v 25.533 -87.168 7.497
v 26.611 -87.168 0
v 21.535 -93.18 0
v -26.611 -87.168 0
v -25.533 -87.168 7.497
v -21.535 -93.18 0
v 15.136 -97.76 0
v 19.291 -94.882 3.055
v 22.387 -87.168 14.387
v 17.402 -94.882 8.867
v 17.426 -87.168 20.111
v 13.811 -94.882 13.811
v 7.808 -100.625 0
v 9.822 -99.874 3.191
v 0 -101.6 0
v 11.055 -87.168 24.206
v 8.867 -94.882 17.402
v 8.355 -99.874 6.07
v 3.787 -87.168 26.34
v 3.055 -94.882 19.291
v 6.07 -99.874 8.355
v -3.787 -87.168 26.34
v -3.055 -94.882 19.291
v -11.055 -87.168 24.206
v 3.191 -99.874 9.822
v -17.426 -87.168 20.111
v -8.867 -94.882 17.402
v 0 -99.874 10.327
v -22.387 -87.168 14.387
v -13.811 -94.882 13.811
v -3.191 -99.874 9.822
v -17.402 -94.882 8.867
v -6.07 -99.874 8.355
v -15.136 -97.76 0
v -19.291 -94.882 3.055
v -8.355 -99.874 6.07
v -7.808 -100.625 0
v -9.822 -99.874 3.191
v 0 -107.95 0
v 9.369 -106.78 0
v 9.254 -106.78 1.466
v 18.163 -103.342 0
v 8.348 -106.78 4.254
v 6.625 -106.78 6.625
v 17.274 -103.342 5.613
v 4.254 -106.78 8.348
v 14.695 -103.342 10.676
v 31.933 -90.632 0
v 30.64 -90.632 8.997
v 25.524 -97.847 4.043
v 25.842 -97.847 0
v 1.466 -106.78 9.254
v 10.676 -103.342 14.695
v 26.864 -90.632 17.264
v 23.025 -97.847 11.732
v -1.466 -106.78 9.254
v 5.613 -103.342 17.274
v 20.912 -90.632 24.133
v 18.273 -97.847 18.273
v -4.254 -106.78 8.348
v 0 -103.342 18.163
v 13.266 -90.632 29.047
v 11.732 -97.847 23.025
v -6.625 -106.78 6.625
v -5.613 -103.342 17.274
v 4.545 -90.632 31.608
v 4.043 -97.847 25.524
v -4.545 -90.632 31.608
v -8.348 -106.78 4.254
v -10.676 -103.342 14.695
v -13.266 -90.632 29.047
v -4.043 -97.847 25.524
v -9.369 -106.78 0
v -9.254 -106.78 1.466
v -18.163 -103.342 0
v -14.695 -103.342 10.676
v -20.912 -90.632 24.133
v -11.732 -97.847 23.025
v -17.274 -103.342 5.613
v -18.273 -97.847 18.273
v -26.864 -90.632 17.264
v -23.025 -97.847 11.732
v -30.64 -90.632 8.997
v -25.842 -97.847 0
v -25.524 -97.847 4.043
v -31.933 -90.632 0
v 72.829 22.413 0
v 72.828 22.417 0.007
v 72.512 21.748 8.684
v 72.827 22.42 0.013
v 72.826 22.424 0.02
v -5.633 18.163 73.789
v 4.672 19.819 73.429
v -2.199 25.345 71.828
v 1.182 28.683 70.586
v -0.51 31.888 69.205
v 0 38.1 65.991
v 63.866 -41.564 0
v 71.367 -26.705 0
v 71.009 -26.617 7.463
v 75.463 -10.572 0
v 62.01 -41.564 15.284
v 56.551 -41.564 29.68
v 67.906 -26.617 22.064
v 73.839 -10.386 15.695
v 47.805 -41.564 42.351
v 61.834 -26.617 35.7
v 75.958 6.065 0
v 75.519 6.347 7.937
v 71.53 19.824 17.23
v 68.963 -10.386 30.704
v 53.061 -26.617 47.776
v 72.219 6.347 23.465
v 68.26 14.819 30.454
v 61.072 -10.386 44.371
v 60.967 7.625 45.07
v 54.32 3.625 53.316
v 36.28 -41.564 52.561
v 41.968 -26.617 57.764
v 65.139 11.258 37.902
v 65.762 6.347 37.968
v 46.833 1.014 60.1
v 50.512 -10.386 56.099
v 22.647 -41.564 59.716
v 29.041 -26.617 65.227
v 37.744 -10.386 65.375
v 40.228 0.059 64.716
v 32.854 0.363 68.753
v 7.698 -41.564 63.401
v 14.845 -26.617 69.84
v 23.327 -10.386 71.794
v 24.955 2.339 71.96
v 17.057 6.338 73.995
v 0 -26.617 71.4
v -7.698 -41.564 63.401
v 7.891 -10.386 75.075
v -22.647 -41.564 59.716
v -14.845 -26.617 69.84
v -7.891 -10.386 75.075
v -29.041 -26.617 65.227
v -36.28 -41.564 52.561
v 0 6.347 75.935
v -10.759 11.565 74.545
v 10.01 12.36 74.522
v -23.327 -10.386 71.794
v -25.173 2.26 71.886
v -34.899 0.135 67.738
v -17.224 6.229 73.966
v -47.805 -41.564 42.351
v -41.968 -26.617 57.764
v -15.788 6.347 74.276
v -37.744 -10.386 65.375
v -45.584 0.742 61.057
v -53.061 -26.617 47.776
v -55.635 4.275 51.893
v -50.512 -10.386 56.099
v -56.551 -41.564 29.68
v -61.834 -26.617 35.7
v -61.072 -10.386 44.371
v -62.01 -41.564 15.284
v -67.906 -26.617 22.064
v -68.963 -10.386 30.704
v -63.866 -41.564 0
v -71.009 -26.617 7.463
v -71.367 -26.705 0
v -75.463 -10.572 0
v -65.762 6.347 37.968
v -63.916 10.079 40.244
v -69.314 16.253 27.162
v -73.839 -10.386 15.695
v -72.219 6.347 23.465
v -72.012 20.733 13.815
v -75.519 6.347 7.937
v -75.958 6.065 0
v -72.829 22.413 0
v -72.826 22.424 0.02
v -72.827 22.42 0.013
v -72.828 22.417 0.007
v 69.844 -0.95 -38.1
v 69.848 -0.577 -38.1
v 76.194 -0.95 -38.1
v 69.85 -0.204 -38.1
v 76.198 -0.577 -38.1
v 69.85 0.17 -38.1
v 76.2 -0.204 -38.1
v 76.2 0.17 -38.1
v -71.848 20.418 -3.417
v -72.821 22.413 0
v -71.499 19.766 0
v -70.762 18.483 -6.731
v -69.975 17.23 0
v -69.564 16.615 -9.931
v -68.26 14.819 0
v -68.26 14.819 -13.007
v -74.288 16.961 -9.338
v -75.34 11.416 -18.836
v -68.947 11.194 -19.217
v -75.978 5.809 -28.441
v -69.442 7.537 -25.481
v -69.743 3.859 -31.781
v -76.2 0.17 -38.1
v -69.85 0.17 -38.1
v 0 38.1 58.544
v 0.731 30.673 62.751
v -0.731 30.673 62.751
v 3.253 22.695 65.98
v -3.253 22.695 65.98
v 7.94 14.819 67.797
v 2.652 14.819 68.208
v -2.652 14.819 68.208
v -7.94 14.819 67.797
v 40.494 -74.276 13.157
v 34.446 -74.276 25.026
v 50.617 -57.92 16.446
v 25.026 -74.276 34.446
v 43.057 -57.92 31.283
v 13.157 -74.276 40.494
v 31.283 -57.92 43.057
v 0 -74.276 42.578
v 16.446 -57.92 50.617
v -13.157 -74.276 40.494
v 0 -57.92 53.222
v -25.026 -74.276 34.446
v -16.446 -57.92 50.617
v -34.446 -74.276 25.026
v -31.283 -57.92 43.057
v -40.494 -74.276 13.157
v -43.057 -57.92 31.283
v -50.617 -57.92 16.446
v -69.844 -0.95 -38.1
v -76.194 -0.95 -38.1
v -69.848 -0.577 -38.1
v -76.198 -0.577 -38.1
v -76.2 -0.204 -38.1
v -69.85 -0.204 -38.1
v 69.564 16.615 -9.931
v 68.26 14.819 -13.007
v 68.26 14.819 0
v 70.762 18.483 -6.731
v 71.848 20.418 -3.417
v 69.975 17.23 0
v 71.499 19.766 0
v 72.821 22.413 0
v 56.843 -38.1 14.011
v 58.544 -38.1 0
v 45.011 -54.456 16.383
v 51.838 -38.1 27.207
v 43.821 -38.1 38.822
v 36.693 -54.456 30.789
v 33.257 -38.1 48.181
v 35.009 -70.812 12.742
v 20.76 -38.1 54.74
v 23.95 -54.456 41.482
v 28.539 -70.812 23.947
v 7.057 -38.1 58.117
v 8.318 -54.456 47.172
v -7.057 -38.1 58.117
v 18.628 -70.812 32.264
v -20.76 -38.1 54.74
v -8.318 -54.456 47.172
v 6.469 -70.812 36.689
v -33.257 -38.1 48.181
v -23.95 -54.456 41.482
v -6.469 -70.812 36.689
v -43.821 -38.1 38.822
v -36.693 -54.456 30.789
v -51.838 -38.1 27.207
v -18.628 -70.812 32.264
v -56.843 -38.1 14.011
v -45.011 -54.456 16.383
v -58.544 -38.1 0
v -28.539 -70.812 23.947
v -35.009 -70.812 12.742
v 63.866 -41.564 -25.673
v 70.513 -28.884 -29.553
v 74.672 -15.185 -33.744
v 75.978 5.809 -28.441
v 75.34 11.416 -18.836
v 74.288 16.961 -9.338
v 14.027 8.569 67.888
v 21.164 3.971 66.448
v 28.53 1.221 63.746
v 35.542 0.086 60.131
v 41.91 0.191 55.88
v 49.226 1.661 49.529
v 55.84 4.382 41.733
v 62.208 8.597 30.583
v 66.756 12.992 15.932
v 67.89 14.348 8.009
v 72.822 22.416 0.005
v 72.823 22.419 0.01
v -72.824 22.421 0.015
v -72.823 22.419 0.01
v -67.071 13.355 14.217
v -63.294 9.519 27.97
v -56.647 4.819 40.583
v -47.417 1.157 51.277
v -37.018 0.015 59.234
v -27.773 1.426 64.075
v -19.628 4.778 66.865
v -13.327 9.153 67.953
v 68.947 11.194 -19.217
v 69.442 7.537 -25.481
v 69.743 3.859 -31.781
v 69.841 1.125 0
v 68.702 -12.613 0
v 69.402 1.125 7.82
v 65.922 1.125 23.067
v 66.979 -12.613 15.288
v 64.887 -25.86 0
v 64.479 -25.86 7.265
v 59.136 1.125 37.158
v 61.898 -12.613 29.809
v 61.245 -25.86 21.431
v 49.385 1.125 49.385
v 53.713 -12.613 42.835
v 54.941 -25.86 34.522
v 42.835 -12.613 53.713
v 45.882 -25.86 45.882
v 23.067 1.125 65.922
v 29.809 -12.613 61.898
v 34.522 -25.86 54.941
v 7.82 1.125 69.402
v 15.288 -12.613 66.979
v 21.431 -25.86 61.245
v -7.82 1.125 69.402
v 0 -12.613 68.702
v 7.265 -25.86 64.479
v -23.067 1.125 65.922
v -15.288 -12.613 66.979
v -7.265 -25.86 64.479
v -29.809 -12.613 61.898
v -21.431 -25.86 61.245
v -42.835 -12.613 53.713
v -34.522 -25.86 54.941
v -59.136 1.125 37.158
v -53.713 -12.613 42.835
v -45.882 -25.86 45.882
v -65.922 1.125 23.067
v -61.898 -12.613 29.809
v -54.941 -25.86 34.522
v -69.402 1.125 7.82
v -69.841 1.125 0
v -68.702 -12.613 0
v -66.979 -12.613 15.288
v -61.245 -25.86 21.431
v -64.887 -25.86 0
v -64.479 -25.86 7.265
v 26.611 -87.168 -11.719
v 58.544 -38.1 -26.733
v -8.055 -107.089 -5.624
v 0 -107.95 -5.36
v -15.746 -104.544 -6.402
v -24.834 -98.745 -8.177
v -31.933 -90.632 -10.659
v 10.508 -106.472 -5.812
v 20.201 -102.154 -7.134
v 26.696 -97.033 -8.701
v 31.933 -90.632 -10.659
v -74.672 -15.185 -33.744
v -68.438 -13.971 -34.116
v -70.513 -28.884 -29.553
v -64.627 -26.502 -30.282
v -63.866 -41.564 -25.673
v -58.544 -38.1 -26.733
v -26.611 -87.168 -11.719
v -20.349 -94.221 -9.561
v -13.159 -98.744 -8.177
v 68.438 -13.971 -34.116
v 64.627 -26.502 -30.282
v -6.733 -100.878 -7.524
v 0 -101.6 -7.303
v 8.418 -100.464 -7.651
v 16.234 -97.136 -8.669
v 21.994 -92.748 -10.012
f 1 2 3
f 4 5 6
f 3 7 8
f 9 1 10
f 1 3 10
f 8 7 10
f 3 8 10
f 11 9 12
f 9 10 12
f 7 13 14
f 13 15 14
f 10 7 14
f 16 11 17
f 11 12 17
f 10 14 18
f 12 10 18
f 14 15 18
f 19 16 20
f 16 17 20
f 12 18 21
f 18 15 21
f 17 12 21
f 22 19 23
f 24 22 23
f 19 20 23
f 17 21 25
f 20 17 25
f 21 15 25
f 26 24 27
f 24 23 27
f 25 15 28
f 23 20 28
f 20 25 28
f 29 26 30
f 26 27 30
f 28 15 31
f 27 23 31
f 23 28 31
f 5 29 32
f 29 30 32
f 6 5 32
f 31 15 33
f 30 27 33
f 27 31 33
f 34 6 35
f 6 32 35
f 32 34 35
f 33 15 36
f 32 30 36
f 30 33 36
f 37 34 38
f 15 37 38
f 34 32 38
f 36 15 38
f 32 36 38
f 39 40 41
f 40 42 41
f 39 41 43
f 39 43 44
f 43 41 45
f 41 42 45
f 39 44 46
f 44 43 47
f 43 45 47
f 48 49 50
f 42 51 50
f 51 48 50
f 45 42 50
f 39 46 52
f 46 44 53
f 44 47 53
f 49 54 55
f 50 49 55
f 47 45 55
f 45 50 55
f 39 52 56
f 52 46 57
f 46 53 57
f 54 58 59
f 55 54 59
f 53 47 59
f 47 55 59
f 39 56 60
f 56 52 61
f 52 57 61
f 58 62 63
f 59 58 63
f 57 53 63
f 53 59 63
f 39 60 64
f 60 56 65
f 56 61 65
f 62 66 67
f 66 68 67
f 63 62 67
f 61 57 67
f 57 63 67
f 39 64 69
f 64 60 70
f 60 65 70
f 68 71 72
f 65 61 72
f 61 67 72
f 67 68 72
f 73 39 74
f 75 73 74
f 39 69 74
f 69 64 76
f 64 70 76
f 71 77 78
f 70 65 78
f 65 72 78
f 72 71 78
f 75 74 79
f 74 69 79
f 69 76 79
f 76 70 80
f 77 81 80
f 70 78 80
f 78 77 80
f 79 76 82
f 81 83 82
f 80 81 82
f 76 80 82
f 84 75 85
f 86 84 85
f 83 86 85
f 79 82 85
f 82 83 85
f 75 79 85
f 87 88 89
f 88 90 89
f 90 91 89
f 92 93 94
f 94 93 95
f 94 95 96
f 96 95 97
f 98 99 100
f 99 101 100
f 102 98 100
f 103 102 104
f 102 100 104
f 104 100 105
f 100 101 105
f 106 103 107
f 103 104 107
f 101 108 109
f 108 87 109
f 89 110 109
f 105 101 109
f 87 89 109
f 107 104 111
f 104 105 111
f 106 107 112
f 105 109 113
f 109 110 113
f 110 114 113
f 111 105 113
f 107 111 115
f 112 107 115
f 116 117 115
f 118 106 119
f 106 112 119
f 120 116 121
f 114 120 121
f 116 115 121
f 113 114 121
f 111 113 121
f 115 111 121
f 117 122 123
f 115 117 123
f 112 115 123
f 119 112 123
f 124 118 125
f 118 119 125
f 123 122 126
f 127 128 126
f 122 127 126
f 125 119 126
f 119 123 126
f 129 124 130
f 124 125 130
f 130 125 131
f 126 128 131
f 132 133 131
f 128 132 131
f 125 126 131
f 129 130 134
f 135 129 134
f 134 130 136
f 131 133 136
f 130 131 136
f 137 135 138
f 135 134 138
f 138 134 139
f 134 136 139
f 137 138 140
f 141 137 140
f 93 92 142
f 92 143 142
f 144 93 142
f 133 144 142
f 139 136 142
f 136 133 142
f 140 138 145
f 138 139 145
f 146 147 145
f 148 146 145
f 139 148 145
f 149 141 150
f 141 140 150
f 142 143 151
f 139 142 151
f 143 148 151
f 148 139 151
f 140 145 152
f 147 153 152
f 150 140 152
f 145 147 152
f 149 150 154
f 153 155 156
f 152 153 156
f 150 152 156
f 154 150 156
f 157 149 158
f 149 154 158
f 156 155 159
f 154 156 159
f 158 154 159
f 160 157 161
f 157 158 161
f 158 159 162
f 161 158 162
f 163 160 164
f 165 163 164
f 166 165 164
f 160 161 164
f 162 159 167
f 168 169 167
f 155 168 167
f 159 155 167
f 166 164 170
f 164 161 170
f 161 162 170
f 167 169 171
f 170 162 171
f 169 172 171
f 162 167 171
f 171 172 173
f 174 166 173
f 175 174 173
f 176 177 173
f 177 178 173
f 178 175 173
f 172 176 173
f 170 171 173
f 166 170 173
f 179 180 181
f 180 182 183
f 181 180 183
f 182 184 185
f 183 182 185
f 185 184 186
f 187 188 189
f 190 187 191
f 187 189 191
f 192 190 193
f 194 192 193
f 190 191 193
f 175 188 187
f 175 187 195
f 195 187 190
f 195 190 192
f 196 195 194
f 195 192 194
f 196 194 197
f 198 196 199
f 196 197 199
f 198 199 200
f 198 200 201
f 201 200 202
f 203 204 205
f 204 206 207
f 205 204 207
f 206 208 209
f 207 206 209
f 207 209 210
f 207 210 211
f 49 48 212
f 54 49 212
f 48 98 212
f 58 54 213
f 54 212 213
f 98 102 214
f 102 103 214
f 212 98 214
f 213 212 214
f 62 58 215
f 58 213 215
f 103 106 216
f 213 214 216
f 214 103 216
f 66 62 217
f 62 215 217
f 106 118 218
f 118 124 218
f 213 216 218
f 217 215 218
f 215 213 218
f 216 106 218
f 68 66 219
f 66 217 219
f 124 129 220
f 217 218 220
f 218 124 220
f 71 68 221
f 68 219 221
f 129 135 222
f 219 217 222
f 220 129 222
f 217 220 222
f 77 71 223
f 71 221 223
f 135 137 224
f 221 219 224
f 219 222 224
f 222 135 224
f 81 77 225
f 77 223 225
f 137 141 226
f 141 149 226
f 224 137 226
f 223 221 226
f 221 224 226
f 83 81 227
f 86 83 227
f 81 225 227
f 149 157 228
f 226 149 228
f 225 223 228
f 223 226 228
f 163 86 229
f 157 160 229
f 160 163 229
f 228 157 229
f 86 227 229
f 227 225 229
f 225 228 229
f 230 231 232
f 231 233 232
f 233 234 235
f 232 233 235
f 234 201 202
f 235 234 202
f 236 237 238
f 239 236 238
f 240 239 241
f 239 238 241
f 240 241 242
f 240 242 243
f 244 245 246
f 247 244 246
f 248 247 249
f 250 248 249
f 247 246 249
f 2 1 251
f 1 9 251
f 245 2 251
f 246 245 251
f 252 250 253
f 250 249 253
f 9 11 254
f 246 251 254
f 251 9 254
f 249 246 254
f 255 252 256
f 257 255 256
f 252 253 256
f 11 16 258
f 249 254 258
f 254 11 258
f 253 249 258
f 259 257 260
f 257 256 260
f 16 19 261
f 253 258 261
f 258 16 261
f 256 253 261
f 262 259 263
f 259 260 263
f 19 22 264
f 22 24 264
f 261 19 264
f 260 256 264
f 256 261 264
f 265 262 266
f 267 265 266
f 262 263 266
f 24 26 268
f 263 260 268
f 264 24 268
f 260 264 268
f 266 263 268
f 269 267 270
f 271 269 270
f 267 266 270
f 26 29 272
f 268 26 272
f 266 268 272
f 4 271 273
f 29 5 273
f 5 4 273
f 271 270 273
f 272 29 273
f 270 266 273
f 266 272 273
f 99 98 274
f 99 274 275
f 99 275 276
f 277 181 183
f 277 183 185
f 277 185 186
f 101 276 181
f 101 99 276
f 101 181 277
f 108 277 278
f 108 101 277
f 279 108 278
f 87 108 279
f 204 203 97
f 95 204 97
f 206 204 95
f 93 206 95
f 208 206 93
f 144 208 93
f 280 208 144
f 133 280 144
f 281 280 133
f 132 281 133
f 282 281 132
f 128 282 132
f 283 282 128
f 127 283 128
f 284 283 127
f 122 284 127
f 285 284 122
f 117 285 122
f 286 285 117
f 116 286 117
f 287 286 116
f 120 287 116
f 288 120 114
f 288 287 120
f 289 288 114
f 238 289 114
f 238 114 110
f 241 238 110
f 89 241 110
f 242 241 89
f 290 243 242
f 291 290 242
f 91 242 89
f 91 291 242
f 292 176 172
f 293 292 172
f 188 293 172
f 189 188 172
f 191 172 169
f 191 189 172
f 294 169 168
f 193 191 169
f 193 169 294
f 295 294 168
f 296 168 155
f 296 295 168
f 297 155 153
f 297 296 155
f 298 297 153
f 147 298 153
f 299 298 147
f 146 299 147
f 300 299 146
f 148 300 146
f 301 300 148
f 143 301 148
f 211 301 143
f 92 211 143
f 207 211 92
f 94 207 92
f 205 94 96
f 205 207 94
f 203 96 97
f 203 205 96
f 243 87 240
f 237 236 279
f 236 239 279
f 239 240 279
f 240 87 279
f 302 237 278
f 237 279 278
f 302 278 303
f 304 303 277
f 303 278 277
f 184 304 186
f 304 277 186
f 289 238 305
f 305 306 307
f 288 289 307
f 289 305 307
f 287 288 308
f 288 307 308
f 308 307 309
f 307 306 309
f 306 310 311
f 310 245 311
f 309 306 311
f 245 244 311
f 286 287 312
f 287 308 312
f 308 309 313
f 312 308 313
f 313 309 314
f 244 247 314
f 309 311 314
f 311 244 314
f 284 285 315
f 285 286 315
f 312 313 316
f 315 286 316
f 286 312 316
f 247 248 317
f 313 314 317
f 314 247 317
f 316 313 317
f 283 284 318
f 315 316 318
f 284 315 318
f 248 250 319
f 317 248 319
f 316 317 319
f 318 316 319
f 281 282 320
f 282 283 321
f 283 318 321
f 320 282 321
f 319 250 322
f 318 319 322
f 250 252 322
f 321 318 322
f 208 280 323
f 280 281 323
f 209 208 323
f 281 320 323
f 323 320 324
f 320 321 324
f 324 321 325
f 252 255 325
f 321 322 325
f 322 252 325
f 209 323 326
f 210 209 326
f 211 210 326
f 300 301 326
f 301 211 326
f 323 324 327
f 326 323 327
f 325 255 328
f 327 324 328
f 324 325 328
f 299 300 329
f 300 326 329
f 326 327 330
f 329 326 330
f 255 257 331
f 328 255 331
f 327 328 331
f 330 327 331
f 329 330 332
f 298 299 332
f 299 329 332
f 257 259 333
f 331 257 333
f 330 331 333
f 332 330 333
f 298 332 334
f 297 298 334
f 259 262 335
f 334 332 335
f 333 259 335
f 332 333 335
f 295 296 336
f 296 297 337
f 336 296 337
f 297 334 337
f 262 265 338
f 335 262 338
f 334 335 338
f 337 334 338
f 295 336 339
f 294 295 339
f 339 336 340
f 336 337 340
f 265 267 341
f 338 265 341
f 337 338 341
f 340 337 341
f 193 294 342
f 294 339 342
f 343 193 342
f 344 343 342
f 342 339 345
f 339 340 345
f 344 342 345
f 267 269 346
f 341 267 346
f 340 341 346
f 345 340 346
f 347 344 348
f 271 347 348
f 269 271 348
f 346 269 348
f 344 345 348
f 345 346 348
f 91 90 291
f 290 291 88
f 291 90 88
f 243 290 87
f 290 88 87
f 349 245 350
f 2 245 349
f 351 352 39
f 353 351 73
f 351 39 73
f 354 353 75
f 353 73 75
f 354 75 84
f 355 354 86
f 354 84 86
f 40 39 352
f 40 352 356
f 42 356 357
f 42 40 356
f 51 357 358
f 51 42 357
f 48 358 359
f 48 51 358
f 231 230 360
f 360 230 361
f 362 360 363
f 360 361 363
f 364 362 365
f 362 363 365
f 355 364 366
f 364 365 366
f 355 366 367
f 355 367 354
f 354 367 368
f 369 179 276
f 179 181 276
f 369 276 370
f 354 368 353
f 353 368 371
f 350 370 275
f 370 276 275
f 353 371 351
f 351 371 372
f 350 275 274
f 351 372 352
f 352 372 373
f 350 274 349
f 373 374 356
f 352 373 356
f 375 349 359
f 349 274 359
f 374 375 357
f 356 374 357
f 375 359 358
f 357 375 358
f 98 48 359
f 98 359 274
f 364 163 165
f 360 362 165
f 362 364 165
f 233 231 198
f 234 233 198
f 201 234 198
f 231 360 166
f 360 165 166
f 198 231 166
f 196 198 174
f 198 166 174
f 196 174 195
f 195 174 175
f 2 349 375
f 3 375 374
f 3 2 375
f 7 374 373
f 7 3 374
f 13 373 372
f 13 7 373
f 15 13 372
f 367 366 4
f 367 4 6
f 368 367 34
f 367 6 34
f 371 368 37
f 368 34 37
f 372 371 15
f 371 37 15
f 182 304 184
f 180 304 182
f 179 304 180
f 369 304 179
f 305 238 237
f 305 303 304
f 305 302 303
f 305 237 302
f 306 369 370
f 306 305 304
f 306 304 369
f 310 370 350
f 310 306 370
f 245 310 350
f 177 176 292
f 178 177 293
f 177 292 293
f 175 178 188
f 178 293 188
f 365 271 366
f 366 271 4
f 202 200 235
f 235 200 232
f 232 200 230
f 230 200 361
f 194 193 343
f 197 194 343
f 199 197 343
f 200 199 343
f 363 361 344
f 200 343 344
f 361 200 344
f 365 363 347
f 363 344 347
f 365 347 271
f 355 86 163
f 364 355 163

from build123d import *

# Parameters (mm, degrees)
F1_ANGLE = 180
F2_DEPTH = 76.201
F3_DEPTH = 38.1
F5_DEPTH = 127


# Not quite as in the source:
# - a feature names something its author has since deleted; it is built from what else it names


with BuildPart() as f1:
    # F0 (on Top) → F1 (revolve)
    with BuildSketch(Plane.XY):
        with BuildLine():
            ThreePointArc((0, 69.85), (43.8400236241, 54.3789925306), (68.2598802346, 14.819286432))
            ThreePointArc((68.2598802346, 14.819286432), (70.7649049458, 18.4884221725), (72.8257812379, 22.4242187621))
            ThreePointArc((72.8257812379, 22.4242187621), (45.2643045364, 61.299125074), (0, 76.2))
            Line((0, 76.2), (0, 69.85))
        make_face()
        with BuildLine():
            Line((58.5441073038, -38.1), (26.6109578654, -87.1681818182))
            ThreePointArc((26.6109578654, -87.1681818182), (15.1362186043, -97.7598080675), (0, -101.6))
            Line((0, -101.6), (0, -107.95))
            ThreePointArc((0, -107.95), (18.1634623251, -103.341769681), (31.9331494384, -90.6318181818))
            Line((31.9331494384, -90.6318181818), (63.8662988769, -41.5636363636))
            ThreePointArc((63.8662988769, -41.5636363636), (75.4638495733, -10.5663336866), (72.8257812379, 22.4242187621))
            ThreePointArc((72.8257812379, 22.4242187621), (70.7649049458, 18.4884221725), (68.2598802346, 14.819286432))
            ThreePointArc((68.2598802346, 14.819286432), (68.7017141928, -12.6133646173), (58.5441073038, -38.1))
        make_face()
    revolve(axis=Axis((0, -12.7, 0), (0, -1, 0)), revolution_arc=F1_ANGLE)

    # F0 (on Top) → F2 (cut, through all)
    with BuildSketch(Plane.XY):
        with BuildLine():
            ThreePointArc((0, 38.1), (25.8012487817, 2.0396239832), (68.2598802346, 14.819286432))
            ThreePointArc((68.2598802346, 14.819286432), (43.8400236241, 54.3789925306), (0, 69.85))
            Line((0, 69.85), (0, 76.2))
            ThreePointArc((0, 76.2), (45.2643045364, 61.299125074), (72.8257812379, 22.4242187621))
            ThreePointArc((72.8257812379, 22.4242187621), (70.1066966834, 58.7683663461), (38.1, 76.2))
            ThreePointArc((38.1, 76.2), (0, 114.3), (-38.1, 76.2))
            ThreePointArc((-38.1, 76.2), (-65.0407683632, 11.1592316368), (0, 38.1))
        make_face()
        with BuildLine():
            ThreePointArc((0, 69.85), (43.8400236241, 54.3789925306), (68.2598802346, 14.819286432))
            ThreePointArc((68.2598802346, 14.819286432), (70.7649049458, 18.4884221725), (72.8257812379, 22.4242187621))
            ThreePointArc((72.8257812379, 22.4242187621), (45.2643045364, 61.299125074), (0, 76.2))
            Line((0, 76.2), (0, 69.85))
        make_face()
    extrude(amount=F2_DEPTH, mode=Mode.SUBTRACT)

    # F3 (add): a face of the model
    f3_faces = [f1.faces().sort_by_distance(p)[0] for p in [
        (72.4843753918, 17.4560748099, 0),
    ]]
    extrude(f3_faces, amount=F3_DEPTH)

    # F4 (on Right) → F5 (cut, symmetric)
    with BuildSketch(Plane.YZ):
        Polygon((22.4127881229, 0), (0, -38.3907258511), (-2.2853469058, -42.3052824003), (29.7282127851, -42.3052824003), (29.7282127851, 12.5305455596), align=None)
        Polygon((-125.4685521126, -38.3907258511), (0, -38.3907258511), (-125.4685521126, 0), align=None)
    extrude(amount=F5_DEPTH, both=True, mode=Mode.SUBTRACT)


solid = f1.part
